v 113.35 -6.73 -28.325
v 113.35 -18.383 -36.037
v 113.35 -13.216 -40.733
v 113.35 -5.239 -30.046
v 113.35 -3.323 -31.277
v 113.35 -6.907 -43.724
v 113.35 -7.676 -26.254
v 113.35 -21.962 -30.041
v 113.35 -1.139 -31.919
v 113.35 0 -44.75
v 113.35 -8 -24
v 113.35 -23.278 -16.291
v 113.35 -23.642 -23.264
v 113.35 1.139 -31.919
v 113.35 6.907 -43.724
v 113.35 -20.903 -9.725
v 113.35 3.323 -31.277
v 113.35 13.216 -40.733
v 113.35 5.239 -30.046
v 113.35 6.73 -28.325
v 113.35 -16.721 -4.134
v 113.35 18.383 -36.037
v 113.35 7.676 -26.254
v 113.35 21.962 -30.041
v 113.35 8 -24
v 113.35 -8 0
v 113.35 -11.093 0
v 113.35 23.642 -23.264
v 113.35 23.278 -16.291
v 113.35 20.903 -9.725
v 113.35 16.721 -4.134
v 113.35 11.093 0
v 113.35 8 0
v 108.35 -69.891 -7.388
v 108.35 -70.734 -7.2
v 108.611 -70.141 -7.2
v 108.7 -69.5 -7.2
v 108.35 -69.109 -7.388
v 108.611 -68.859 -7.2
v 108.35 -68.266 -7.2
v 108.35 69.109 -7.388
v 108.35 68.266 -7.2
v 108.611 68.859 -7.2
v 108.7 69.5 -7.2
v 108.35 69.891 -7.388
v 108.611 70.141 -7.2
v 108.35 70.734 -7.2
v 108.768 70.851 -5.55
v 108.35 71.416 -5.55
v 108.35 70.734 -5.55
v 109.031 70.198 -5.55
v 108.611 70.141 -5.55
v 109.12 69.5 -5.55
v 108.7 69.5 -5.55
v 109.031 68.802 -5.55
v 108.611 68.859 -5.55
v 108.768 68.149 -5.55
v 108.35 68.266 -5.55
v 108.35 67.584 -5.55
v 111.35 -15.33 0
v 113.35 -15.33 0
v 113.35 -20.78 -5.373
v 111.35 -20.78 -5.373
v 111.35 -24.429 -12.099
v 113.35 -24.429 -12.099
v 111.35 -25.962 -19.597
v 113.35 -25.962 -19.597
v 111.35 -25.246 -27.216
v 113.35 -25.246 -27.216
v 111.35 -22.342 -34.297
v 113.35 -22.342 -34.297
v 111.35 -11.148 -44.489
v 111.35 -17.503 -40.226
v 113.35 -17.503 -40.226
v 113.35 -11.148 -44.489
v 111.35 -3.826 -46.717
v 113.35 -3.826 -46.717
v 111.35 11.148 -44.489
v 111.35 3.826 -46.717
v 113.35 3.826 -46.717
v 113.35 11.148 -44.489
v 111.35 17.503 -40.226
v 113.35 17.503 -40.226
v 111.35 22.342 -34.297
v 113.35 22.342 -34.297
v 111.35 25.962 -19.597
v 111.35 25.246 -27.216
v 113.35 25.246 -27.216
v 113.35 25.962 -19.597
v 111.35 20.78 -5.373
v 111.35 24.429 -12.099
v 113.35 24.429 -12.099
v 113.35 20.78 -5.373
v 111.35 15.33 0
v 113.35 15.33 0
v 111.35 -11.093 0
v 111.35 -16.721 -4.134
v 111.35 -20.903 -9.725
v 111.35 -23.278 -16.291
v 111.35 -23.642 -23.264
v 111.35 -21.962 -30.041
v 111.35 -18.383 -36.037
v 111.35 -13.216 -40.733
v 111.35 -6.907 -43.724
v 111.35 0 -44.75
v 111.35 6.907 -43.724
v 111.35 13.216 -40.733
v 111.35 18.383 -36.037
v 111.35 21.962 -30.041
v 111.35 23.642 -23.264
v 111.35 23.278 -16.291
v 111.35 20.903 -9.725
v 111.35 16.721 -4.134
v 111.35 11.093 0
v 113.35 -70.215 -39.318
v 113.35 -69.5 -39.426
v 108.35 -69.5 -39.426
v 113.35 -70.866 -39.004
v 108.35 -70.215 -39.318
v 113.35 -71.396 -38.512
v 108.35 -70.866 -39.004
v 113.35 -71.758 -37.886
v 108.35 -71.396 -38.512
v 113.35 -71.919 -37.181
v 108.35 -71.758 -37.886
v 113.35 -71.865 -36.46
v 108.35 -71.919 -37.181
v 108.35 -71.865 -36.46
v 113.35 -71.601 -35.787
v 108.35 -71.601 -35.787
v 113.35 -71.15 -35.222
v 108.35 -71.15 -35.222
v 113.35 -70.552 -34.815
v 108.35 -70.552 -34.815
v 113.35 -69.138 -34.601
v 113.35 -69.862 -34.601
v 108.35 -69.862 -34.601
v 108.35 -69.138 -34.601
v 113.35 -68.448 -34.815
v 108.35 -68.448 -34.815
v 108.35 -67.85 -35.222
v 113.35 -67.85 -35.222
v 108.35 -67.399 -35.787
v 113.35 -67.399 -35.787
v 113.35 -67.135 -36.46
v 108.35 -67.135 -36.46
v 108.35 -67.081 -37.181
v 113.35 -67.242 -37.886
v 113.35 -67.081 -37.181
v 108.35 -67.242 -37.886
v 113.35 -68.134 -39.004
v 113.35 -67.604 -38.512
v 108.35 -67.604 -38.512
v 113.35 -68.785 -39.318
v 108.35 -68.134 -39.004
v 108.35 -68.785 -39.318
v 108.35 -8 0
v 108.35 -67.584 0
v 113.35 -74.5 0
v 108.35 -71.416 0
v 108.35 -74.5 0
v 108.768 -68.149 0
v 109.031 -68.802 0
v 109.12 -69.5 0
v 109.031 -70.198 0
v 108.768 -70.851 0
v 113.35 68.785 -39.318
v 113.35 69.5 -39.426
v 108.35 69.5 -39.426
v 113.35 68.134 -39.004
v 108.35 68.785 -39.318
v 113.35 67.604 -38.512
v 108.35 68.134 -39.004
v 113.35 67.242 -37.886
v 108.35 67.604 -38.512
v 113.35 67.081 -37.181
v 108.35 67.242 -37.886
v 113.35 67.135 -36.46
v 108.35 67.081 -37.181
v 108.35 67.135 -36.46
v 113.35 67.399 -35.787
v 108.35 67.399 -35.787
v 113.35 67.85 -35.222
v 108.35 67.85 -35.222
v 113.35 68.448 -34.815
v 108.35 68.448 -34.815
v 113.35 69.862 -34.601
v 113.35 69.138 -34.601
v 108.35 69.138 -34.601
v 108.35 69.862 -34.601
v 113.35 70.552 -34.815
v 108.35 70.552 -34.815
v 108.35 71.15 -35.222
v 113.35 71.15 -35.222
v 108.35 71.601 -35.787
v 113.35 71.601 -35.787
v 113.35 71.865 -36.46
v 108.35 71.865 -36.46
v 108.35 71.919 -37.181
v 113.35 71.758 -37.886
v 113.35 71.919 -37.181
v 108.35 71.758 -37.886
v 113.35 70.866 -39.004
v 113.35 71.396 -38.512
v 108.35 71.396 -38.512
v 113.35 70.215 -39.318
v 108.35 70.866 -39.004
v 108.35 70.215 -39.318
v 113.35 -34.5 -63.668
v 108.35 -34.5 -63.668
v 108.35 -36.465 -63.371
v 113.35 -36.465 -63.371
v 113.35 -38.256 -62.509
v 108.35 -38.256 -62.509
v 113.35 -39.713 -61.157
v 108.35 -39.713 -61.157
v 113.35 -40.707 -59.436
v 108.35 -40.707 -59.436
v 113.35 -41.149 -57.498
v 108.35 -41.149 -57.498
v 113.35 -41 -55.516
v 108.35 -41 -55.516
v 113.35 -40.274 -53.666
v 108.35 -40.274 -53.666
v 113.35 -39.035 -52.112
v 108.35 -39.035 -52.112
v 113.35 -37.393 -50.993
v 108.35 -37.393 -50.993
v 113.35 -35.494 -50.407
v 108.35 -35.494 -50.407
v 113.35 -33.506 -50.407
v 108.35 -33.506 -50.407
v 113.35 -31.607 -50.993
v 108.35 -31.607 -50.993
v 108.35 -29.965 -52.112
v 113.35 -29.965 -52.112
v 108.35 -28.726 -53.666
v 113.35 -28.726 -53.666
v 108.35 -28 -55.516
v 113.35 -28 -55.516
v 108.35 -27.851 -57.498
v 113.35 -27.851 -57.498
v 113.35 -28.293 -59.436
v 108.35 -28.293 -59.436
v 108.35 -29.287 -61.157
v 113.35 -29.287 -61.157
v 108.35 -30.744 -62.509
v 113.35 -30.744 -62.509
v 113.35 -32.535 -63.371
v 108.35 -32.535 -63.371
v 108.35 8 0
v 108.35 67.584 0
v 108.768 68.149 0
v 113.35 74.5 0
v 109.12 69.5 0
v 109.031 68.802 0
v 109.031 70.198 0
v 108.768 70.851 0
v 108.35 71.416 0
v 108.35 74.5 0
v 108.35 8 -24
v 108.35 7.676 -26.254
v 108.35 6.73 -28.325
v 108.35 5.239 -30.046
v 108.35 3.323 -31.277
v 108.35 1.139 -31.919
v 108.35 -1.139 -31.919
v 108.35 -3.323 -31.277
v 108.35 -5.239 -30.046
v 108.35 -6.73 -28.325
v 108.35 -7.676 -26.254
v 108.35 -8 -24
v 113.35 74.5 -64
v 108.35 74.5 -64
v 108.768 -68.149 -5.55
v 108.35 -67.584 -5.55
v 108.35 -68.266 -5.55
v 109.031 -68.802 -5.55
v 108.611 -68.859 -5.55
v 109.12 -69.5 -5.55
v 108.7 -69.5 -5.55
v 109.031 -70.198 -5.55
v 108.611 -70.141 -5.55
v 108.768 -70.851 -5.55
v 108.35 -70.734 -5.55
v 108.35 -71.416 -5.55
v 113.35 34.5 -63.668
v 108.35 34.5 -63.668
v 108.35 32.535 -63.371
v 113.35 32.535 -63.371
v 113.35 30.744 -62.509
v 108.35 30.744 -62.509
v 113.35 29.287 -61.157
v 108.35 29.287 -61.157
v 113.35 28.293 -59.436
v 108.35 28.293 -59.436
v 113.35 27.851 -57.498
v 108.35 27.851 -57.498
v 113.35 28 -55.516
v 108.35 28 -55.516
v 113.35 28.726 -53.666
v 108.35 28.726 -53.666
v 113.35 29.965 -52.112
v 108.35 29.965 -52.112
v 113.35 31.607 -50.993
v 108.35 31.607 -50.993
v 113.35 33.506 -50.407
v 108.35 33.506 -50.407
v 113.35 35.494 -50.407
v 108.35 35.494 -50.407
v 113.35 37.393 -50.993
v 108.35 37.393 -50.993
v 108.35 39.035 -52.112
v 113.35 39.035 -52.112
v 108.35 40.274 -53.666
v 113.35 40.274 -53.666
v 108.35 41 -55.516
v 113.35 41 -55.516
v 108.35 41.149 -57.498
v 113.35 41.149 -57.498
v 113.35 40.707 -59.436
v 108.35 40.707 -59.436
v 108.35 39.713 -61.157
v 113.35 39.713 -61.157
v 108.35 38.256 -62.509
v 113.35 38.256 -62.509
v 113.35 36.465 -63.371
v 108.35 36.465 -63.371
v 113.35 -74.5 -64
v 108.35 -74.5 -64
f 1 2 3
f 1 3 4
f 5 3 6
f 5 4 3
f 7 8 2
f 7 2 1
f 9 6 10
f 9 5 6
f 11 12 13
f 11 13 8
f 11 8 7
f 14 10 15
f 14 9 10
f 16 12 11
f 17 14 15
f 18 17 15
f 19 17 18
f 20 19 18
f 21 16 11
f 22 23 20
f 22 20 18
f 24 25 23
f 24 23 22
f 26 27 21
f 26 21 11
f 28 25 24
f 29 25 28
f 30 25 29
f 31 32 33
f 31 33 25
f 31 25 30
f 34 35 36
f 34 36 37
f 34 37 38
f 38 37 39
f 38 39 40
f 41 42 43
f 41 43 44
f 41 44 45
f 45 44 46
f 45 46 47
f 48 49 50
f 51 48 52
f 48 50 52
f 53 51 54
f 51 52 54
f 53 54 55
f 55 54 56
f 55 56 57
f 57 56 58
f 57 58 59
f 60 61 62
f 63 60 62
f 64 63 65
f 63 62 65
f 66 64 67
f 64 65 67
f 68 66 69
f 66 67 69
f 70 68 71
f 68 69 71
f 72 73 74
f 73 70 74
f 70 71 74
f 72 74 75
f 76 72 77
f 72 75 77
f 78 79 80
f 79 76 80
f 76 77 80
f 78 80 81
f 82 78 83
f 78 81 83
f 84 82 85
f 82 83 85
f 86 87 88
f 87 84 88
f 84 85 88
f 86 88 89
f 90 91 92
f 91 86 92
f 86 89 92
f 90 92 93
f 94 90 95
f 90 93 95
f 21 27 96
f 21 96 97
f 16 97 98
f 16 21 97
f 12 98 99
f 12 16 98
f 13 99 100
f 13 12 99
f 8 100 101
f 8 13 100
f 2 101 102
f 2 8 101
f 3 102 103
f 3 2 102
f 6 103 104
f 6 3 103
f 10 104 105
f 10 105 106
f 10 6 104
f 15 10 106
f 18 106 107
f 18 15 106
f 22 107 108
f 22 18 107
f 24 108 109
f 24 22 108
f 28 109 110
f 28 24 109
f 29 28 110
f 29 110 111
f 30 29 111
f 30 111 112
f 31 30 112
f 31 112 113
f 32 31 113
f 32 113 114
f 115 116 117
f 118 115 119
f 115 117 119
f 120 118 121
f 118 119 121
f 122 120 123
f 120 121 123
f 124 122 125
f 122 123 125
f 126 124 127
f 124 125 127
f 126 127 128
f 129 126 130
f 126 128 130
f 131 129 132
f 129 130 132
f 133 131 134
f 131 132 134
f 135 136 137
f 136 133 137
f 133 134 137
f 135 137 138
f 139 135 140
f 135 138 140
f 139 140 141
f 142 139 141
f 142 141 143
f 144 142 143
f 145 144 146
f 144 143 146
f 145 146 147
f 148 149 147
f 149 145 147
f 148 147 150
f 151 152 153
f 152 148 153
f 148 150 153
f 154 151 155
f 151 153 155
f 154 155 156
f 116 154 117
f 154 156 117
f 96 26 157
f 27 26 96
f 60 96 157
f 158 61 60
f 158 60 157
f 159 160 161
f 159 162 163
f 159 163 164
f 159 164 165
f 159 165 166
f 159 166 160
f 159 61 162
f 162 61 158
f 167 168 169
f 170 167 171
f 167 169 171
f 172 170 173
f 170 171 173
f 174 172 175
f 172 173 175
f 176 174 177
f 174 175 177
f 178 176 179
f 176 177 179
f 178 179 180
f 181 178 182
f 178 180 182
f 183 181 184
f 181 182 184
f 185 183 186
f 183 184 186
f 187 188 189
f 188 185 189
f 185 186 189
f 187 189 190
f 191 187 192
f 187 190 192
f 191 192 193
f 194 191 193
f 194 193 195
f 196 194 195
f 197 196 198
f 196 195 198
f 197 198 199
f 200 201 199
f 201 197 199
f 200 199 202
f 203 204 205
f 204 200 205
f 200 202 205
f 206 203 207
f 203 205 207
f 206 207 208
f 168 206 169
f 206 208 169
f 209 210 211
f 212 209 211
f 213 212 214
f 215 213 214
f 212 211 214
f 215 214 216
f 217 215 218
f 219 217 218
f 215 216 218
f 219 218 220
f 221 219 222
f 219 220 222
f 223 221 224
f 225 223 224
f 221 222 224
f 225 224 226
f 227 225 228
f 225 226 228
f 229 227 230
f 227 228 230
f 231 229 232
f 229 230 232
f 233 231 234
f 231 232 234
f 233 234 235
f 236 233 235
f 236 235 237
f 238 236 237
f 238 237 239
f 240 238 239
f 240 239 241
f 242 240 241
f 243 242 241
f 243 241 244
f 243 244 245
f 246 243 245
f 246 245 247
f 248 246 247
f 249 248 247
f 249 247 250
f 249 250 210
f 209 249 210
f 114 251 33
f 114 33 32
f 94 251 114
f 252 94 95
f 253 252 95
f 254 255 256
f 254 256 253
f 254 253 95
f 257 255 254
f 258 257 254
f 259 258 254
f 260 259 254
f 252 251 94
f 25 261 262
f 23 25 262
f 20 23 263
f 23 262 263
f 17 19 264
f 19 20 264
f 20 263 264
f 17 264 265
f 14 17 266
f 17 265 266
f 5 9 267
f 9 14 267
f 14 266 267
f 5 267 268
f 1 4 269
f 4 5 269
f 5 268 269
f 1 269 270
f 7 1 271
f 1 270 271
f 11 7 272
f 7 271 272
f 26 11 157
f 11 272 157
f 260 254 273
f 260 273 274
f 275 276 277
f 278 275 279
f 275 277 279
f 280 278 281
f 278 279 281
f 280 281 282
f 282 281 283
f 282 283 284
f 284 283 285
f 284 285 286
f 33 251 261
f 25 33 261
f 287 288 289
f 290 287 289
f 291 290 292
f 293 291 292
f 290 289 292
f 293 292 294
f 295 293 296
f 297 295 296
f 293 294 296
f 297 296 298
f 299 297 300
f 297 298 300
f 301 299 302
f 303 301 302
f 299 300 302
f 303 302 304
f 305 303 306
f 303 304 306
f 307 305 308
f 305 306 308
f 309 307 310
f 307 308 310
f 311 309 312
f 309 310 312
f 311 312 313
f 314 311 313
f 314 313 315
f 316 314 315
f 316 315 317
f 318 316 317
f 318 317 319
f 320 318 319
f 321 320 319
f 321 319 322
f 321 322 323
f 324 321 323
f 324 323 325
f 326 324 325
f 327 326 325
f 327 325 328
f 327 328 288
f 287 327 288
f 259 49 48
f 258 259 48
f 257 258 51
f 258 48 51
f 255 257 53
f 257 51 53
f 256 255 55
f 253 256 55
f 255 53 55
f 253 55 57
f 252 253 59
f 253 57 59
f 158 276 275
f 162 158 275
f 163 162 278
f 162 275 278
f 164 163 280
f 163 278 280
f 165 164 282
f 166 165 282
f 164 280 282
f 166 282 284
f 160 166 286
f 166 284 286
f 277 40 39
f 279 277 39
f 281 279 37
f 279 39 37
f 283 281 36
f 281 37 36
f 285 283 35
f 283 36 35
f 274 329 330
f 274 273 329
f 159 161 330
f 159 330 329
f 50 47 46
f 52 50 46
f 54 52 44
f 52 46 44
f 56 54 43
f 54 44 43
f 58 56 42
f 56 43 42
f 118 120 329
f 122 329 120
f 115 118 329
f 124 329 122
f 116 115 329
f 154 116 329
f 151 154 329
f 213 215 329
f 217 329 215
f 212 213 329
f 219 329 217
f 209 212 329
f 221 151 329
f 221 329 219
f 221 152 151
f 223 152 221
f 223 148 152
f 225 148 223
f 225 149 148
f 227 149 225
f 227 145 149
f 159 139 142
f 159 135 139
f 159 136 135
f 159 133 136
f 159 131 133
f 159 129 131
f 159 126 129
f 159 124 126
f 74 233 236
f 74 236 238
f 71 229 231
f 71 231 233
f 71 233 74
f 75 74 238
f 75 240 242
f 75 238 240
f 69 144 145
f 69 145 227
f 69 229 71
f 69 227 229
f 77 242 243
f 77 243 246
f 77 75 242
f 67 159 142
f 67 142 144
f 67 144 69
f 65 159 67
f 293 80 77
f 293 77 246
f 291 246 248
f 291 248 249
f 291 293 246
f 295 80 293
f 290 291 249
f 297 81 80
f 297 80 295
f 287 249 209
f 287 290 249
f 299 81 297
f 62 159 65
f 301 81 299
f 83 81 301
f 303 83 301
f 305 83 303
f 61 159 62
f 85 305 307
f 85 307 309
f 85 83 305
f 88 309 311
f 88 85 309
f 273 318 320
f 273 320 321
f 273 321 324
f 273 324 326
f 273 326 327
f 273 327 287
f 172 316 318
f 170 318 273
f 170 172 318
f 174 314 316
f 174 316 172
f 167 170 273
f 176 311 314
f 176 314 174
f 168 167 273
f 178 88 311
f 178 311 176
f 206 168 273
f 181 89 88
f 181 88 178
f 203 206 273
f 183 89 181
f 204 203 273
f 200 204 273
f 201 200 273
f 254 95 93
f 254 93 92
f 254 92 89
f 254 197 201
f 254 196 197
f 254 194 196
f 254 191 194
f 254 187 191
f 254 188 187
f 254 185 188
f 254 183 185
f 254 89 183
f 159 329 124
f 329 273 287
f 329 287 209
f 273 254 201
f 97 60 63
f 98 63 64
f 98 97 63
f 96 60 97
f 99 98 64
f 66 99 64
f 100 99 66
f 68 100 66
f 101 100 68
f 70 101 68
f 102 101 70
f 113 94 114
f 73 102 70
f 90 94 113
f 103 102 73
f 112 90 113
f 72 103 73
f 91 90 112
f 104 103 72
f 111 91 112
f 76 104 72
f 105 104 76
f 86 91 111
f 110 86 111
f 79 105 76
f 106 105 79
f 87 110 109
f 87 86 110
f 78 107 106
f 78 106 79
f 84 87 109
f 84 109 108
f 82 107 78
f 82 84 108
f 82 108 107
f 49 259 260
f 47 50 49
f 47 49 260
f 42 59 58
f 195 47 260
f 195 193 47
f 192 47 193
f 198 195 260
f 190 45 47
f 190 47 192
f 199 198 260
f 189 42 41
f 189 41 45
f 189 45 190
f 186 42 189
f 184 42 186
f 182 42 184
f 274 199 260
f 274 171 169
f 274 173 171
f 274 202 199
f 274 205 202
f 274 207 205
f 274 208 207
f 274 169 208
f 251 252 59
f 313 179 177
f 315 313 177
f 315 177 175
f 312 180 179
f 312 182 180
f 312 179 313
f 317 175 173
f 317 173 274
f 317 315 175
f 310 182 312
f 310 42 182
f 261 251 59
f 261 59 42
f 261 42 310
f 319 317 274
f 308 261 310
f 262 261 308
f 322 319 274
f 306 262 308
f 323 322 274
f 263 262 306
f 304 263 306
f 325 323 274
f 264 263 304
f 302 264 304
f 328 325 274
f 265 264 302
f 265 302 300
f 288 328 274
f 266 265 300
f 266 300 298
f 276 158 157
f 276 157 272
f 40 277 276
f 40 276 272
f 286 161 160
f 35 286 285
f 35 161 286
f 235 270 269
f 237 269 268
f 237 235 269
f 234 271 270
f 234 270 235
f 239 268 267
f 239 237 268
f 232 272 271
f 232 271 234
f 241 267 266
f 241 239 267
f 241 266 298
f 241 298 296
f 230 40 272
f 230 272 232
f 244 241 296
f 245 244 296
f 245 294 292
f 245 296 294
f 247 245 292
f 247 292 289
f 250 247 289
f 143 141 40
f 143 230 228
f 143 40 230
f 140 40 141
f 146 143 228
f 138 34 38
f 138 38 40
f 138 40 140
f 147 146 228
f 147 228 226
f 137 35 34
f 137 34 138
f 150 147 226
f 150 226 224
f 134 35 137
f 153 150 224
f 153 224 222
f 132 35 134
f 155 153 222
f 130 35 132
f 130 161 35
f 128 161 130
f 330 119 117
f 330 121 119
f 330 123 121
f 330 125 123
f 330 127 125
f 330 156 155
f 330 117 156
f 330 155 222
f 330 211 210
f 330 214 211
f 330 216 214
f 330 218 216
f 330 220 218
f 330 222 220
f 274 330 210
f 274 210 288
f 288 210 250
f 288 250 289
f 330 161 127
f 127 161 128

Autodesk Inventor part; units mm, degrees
ref_plane "XZ Plane" through (0, 0, 0) normal (0, 1, 0) x (-1, 0, 0)
ref_plane "XY Plane" through (0, 0, 0) normal (0, 0, 1) x (1, 0, 0)
sketch "Sketch1" plane through (0, 0, 0) normal (0, 0, 1) x (1, 0, 0)
  line L0 (-111.35, -74.5) -> (111.35, -74.5)
  line L1 (111.35, -74.5) -> (111.35, 74.5)
  line L2 (111.35, 74.5) -> (-111.35, 74.5)
  line L3 (-111.35, 74.5) -> (-111.35, -74.5)
  line L4 (-111.35, -74.5) -> (111.35, 74.5) construction
  line L5 (111.35, -74.5) -> (-111.35, 74.5) construction
  point P0 (0, 0)
  dimension "d0" = 222.7
  dimension "d1" = 149
extrude "MainInnerBodyExtrusion" add sketch "Sketch1" against normal blind 50
sketch "Sketch3" plane through (0, 0, 0) normal (0, 0, 1) x (1, 0, 0)
  line L0 (36.65, -27) -> (95.65, -27)
  line L1 (95.65, -27) -> (95.65, 27)
  line L2 (95.65, 27) -> (36.65, 27)
  line L3 (36.65, 27) -> (36.65, -27)
  line L4 (36.65, -27) -> (95.65, 27) construction
  line L5 (95.65, -27) -> (36.65, 27) construction
  line L6 (111.35, -74.5) -> (111.35, 74.5) projected
  line L7 (0, 0) -> (111.35, 0) construction
  line L8 (-111.35, -74.5) -> (-111.35, 74.5) construction
  line L9 (-111.35, 74.5) -> (-111.35, -74.5) projected
  point P0 (66.15, 0)
  point P1 (66.15, 0)
  dimension "d5" = 15.7
  dimension "d6" = 54
  dimension "d7" = 59
extrude "HoleForCamerabase" cut sketch "Sketch3" against normal blind 47
sketch "Sketch4" plane through (0, 0, 0) normal (0, 0, 1) x (1, 0, 0)
  line L0 (0, 0) -> (-111.35, 0) construction
  line L1 (-111.35, -74.5) -> (-111.35, 74.5) construction
  line L2 (-108.35, -31) -> (-92.35, -31)
  line L3 (-92.35, -31) -> (-92.35, 31)
  line L4 (-92.35, 31) -> (-108.35, 31)
  line L5 (-108.35, 31) -> (-108.35, -31)
  line L6 (-108.35, -31) -> (-92.35, 31) construction
  line L7 (-92.35, -31) -> (-108.35, 31) construction
  point P0 (-100.35, 0)
  dimension "d13" = 16
  dimension "d14" = 62
  dimension "d15" = 3
extrude "HoleForFan" cut sketch "Sketch4" against normal blind 47
sketch "Sketch6" plane through (0, 0, 0) normal (0, 0, 1) x (1, 0, 0)
  line L0 (-111.35, -74.5) -> (-111.35, 74.5) construction
  line L1 (-111.35, 0) -> (111.35, 0) construction
  line L2 (111.35, 74.5) -> (111.35, -74.5) construction
  line L3 (-11.35, -64.5) -> (20.65, -64.5)
  line L4 (20.65, -64.5) -> (20.65, 64.5)
  line L5 (20.65, 64.5) -> (-11.35, 64.5)
  line L6 (-11.35, 64.5) -> (-11.35, -64.5)
  line L7 (-11.35, -64.5) -> (20.65, 64.5) construction
  line L8 (20.65, -64.5) -> (-11.35, 64.5) construction
  line L9 (36.65, -27) -> (36.65, 27) projected
  point P0 (0, 0)
  point P1 (4.65, 0)
  dimension "d20" = 32
  dimension "d21" = 129
  dimension "d88" = 16
extrude "HoleForPi" cut sketch "Sketch6" against normal blind 47
sketch "Sketch7" plane through (0, 0, 0) normal (0, 0, 1) x (1, 0, 0)
  line L0 (0, 0) -> (-111.35, 0) construction
  line L1 (-111.35, 74.5) -> (-111.35, -74.5) construction
  line L2 (-76.35, -59) -> (-27.35, -59)
  line L3 (-27.35, -59) -> (-27.35, 59)
  line L4 (-27.35, 59) -> (-76.35, 59)
  line L5 (-76.35, 59) -> (-76.35, -59)
  line L6 (-76.35, -59) -> (-27.35, 59) construction
  line L7 (-27.35, -59) -> (-76.35, 59) construction
  line L8 (-11.35, -64.5) -> (-11.35, 64.5) projected
  line L9 (-92.35, 31) -> (-92.35, -31) construction
  point P0 (-51.85, 0)
  dimension "d25" = 16
  dimension "d26" = 49
  dimension "d27" = 118
extrude "HoleForPoeAdapter" cut sketch "Sketch7" against normal blind 47
sketch "Sketch10" plane through (0, 0, 0) normal (0, 0, 1) x (1, 0, 0)
  line L0 (39.35, 36.5) -> (108.35, 36.5)
  line L1 (108.35, 36.5) -> (108.35, 64.5)
  line L2 (108.35, 64.5) -> (39.35, 64.5)
  line L3 (39.35, 64.5) -> (39.35, 36.5)
  line L4 (39.35, 36.5) -> (108.35, 64.5) construction
  line L5 (108.35, 36.5) -> (39.35, 64.5) construction
  line L6 (111.35, 74.5) -> (-111.35, 74.5) projected
  line L7 (111.35, -74.5) -> (111.35, 74.5) projected
  point P0 (0, 0)
  point P1 (73.85, 50.5)
  point P2 (94.85, 8.5)
  point P3 (108.35, 50.5)
  dimension "d36" = 69
  dimension "d37" = 28
  dimension "d85" = 3
extrude "HoleForThermister" cut sketch "Sketch10" against normal blind 47
sketch "Sketch11" plane through (0, 0, 0) normal (0, 0, 1) x (1, 0, 0)
  line L0 (58.35, -64.5) -> (108.35, -64.5)
  line L1 (108.35, -64.5) -> (108.35, -47.5)
  line L2 (108.35, -47.5) -> (58.35, -47.5)
  line L3 (58.35, -47.5) -> (58.35, -64.5)
  line L4 (58.35, -64.5) -> (108.35, -47.5) construction
  line L5 (108.35, -64.5) -> (58.35, -47.5) construction
  line L6 (111.35, -74.5) -> (111.35, 74.5) projected
  line L7 (-111.35, -74.5) -> (111.35, -74.5) projected
  line L8 (95.65, -27) -> (36.65, -27) projected
  line L9 (20.65, 64.5) -> (20.65, -64.5) projected
  point P0 (0, 0)
  point P1 (83.35, -56)
  point P2 (94.85, -8.5)
  point P3 (83.35, -47.5)
  point P4 (58.35, -56)
  point P5 (111.35, 74.5)
  dimension "d42" = 50
  dimension "d43" = 17
  dimension "d86" = 3
  dimension "d87" = 10
extrude "HoleForSensor" cut sketch "Sketch11" against normal blind 31.5
sketch "Sketch15" plane through (-111.35, -74.5, 0) normal (-1, 0, 0) x (0, 0, 1)
  line L0 (0, 149) -> (0, 0) projected
  line L1 (0, 149) -> (-50, 149) projected
  line L2 (-50, 0) -> (-50, 149) projected
  line L3 (0, 0) -> (-50, 0) projected
  line L4 (0, 0) -> (0, 149) projected
  line L5 (0, 101.5) -> (0, 47.5) projected
  line L6 (0, 74.5) -> (-30, 74.5) construction
  line L7 (0, 76.5) -> (-29.9333, 76.5)
  line L8 (0, 84.5) -> (-28.2843, 84.5)
  line L9 (0, 80.5) -> (-29.3939, 80.5)
  line L10 (0, 76.5) -> (0, 74.5)
  line L11 (0, 88.5) -> (-26.533, 88.5)
  line L12 (0, 92.5) -> (-24, 92.5)
  line L13 (-20.5913, 97.5) -> (0, 97.5)
  line L14 (-14.9666, 101.5) -> (0, 101.5)
  line L15 (0, 84.5) -> (0, 80.5)
  line L16 (0, 101.5) -> (0, 97.5)
  line L17 (0, 92.5) -> (0, 88.5)
  line L18 (0, 72.5) -> (-29.9333, 72.5)
  line L19 (0, 64.5) -> (-28.2843, 64.5)
  line L20 (0, 68.5) -> (-29.3939, 68.5)
  line L21 (0, 72.5) -> (0, 74.5)
  line L22 (0, 60.5) -> (-26.533, 60.5)
  line L23 (0, 56.5) -> (-24, 56.5)
  line L24 (-20.5913, 51.5) -> (0, 51.5)
  line L25 (-14.9666, 47.5) -> (0, 47.5)
  line L26 (0, 64.5) -> (0, 68.5)
  line L27 (0, 56.5) -> (0, 60.5)
  line L28 (0, 47.5) -> (0, 51.5)
  line L29 (0, 72.5) -> (0, 76.5)
  line L30 (0, 80.5) -> (0, 84.5)
  line L31 (0, 88.5) -> (0, 92.5)
  line L32 (0, 97.5) -> (0, 149)
  arc A0 (-28.2843, 84.5) -> (-29.3939, 80.5) centre (0, 74.5) ccw
  arc A1 (-14.9666, 101.5) -> (-20.5913, 97.5) centre (0, 74.5) ccw
  arc A2 (-24, 92.5) -> (-26.533, 88.5) centre (0, 74.5) ccw
  arc A3 (-29.9333, 76.5) -> (-29.9333, 72.5) centre (0, 74.5) ccw
  arc A4 (-29.3939, 68.5) -> (-28.2843, 64.5) centre (0, 74.5) ccw
  arc A5 (-26.533, 60.5) -> (-24, 56.5) centre (0, 74.5) ccw
  arc A6 (-20.5913, 51.5) -> (-14.9666, 47.5) centre (0, 74.5) ccw
  point P0 (0, 82)
  point P1 (0, 67.0167)
  point P2 (0, 4.25)
  point P3 (-10.2956, 97.5)
  point P4 (0, 47.5)
  point P5 (0, 51.5)
  point P6 (0, 56.5)
  point P7 (0, 60.5)
  point P8 (0, 64.5)
  point P9 (0, 68.5)
  point P10 (0, 72.5)
  point P11 (0, 80.5)
  point P12 (0, 84.5)
  point P13 (0, 88.5)
  point P14 (0, 92.5)
  point P15 (0, 97.5)
  point P16 (0, 101.5)
  dimension "d69" = 2
  dimension "d71" = 4
  dimension "d72" = 4
  dimension "d73" = 4
  dimension "d75" = 4
  dimension "d142" = 30
extrude "SlotsForRearFan" cut sketch "Sketch15" against normal up to surface (3 mm away) contours L0 L13 A1 L14 | L0 L11 A2 L12 | L25 A6 L24 L0 | L0 L9 A0 L8 | L23 A5 L22 L0 | L0 L18 A3 L7 | L19 A4 L20 L0
sketch "Sketch16" plane through (0, 0, -47) normal (0, 0, 1) x (1, 0, 0)
  line L0 (95.65, 27) -> (95.65, -27) projected
  line L1 (80.15, 10.765) -> (80.15, -11.235) construction
  line L2 (78.65, 10.765) -> (78.65, -11.235)
  line L3 (75.65, -11.235) -> (75.65, 10.765)
  line L4 (72.65, 8.7746) -> (72.65, -9.2446)
  line L5 (69.65, 3.5785) -> (69.65, -4.0485)
  line L6 (81.65, 10.765) -> (81.65, -11.235)
  line L7 (84.65, -11.235) -> (84.65, 10.765)
  line L8 (87.65, 8.7746) -> (87.65, -9.2446)
  line L9 (90.65, 3.5785) -> (90.65, -4.0485)
  line L10 (73.7991, 10.765) -> (75.65, 10.765)
  line L11 (75.65, -11.235) -> (73.7991, -11.235)
  line L12 (73.7991, -11.235) -> (72.65, -9.2446)
  line L13 (69.65, -4.0485) -> (67.4483, -0.235)
  line L14 (67.4483, -0.235) -> (69.65, 3.5785)
  line L15 (72.65, 8.7746) -> (73.7991, 10.765)
  line L16 (78.65, 10.765) -> (81.65, 10.765)
  line L17 (84.65, 10.765) -> (86.5009, 10.765)
  line L18 (86.5009, -11.235) -> (84.65, -11.235)
  line L19 (81.65, -11.235) -> (78.65, -11.235)
  line L20 (92.8517, -0.235) -> (90.65, -4.0485)
  line L21 (87.65, -9.2446) -> (86.5009, -11.235)
  line L22 (86.5009, 10.765) -> (87.65, 8.7746)
  line L23 (90.65, 3.5785) -> (92.8517, -0.235)
  point P0 (0, 0)
  point P1 (80.15, -0.235)
  point P2 (69.65, -0.235)
  dimension "d78" = 15.5
  dimension "d89" = 1.5
  dimension "d90" = 3
  dimension "d91" = 3
  dimension "d92" = 3
extrude "VentForCamera" cut sketch "Sketch16" against normal through all
sketch "Sketch18" plane through (111.35, -74.5, 0) normal (1, 0, 0) x (0, 0, -1)
  line L0 (0, 74.5) -> (29.6767, 74.5) construction
  arc A0 (24, 66.5) -> (24, 82.5) centre (24, 74.5) ccw
  line L1 (0, 0) -> (0, 149) projected
  line L2 (24, 82.5) -> (0, 82.5)
  line L3 (24, 66.5) -> (0, 66.5)
  line L4 (0, 82.5) -> (0, 66.5)
  point P0 (0, 74.5)
  dimension "d97" = 16
  dimension "d137" = 24
extrude "HoleForLens" cut sketch "Sketch18" against normal up to surface (15.7 mm away)
sketch "Sketch23" plane through (0, 0, 0) normal (0, 0, 1) x (1, 0, 0)
  line L0 (-106.35, -69.5) -> (106.35, -69.5) construction
  line L1 (106.35, -69.5) -> (106.35, 69.5) construction
  line L2 (106.35, 69.5) -> (-106.35, 69.5) construction
  line L3 (-106.35, 69.5) -> (-106.35, -69.5) construction
  line L4 (-106.35, -69.5) -> (106.35, 69.5) construction
  line L5 (106.35, -69.5) -> (-106.35, 69.5) construction
  line L6 (111.35, -74.5) -> (111.35, -8) projected
  line L7 (111.35, 74.5) -> (-111.35, 74.5) projected
  line L8 (-111.35, -27) -> (-111.35, -74.5) projected
  line L9 (-111.35, 74.5) -> (-111.35, 27) projected
  line L10 (111.35, 8) -> (111.35, 74.5) projected
  point P0 (0, 0)
  point P1 (35.15, -69.5)
  point P2 (-35.15, -69.5)
  point P3 (-35.15, 69.5)
  point P4 (35.15, 69.5)
  dimension "d106" = 5
  dimension "d108" = 5
  dimension "d222" = 76.2
  dimension "d223" = 76.2
  dimension "d224" = 76.2
  dimension "d225" = 76.2
hole "Hole for 6-32 Insert" at (-106.35, 69.5, 0) at (106.35, 69.5, 0) at (106.35, -69.5, 0) at (-106.35, -69.5, 0) at (-35.15, -69.5, 0) at (35.15, -69.5, 0) at (-35.15, 69.5, 0) at (35.15, 69.5, 0) direction (0, 0, -1) diameter 4.7 depth 7.2 tip angle 118 counterbore diameter 5.54 counterbore depth 5.55
hole "Screw hole for 6-32 screw" at (-106.35, -69.5, 0) at (106.35, -69.5, 0) at (106.35, 69.5, 0) at (-106.35, 69.5, 0) direction (0, 0, -1) diameter 3.797 depth 15 tip angle 118 clearance for "Hex Machine Screw" size "#6" standard "Ansi Unified Screw Threads"
sketch "Sketch24" plane through (-111.35, -74.5, 0) normal (0, -1, 0) x (1, 0, 0)
  line L0 (0, -50) -> (222.7, -50) construction
  line L1 (222.7, 0) -> (207, 0) construction
  line L2 (0, 0) -> (0, -50) projected
  line L3 (111.3501, -25) -> (0, -25) construction
  line L4 (111.3501, -25) -> (222.7, -24.84) construction
  line L5 (222.7, 0) -> (222.7, -50) construction
  point P0 (111.35, 0)
  dimension "d226" = 25
  dimension "d227" = 111.3501
hole "Side hole for 1-4 20 insert" at (0.0001, -74.5, -25) direction (0, 1, 0) diameter 7.666 depth 9.53 tip angle 118 counterbore diameter 8.406 counterbore depth 7.41 clearance for "Hex Machine Screw" size "1/4" standard "Ansi Unified Screw Threads"
mirror "Mirror for side insert" about plane through (0, 0, 0) normal (0, 1, 0) of "Side hole for 1-4 20 insert"
sketch "Sketch25" plane through (0, 0, 0) normal (0, 0, 1) x (1, 0, 0)
  line L0 (111.35, 74.5) -> (-111.35, 74.5) projected
  line L1 (-111.35, 74.5) -> (-111.35, 27) projected
  line L2 (-111.35, -74.5) -> (111.35, -74.5) projected
  line L3 (81.65, -11.235) -> (78.65, -11.235) projected
  line L4 (78.65, -11.235) -> (78.65, 10.765) projected
  line L5 (78.65, 10.765) -> (81.65, 10.765) projected
  line L6 (81.65, 10.765) -> (81.65, -11.235) projected
  line L7 (73.7991, 10.765) -> (75.65, 10.765) projected
  line L8 (75.65, 10.765) -> (75.65, -11.235) projected
  line L9 (75.65, -11.235) -> (73.7991, -11.235) projected
  line L10 (73.7991, -11.235) -> (72.65, -9.2446) projected
  line L11 (72.65, -9.2446) -> (72.65, 8.7746) projected
  line L12 (72.65, 8.7746) -> (73.7991, 10.765) projected
  line L13 (87.65, 8.7746) -> (87.65, -9.2446) projected
  line L14 (87.65, -9.2446) -> (86.5009, -11.235) projected
  line L15 (86.5009, -11.235) -> (84.65, -11.235) projected
  line L16 (84.65, -11.235) -> (84.65, 10.765) projected
  line L17 (84.65, 10.765) -> (86.5009, 10.765) projected
  line L18 (86.5009, 10.765) -> (87.65, 8.7746) projected
  line L19 (69.65, 3.5785) -> (69.65, -4.0485) projected
  line L20 (69.65, -4.0485) -> (67.4483, -0.235) projected
  line L21 (67.4483, -0.235) -> (69.65, 3.5785) projected
  line L22 (92.8517, -0.235) -> (90.65, -4.0485) projected
  line L23 (90.65, -4.0485) -> (90.65, 3.5785) projected
  line L24 (90.65, 3.5785) -> (92.8517, -0.235) projected
  line L25 (95.65, 27) -> (95.65, -27) projected
  line L26 (36.65, 27) -> (95.65, 27) projected
  line L27 (36.65, -27) -> (36.65, 27) projected
  line L28 (95.65, -27) -> (36.65, -27) projected
  line L29 (111.35, -74.5) -> (111.35, -8) projected
  line L30 (111.35, 8) -> (111.35, 74.5) projected
  line L31 (-108.35, -64.5) -> (108.35, -64.5)
  line L32 (108.35, -64.5) -> (108.35, 64.5)
  line L33 (108.35, 64.5) -> (-108.35, 64.5)
  line L34 (-108.35, 64.5) -> (-108.35, -64.5)
  line L35 (-108.35, -64.5) -> (108.35, 64.5) construction
  line L36 (108.35, -64.5) -> (-108.35, 64.5) construction
  line L37 (-27.35, 59) -> (-27.35, -59) projected
  point P0 (0, 0)
  dimension "d138" = 10
  dimension "d139" = 3
extrude "Extrusion18" cut sketch "Sketch25" against normal blind 25 contours L34 L33 L32 L31
sketch "Sketch26" plane through (-111.35, -74.5, -50) normal (-1, 0, 0) x (0, 0, 1)
  arc A0 (50, 124) -> (50, 134) centre (50, 129) ccw
  circle A1 centre (50, 129) radius 5
  point P0 (50, 74.5)
  point P1 (50, 124)
extrude "HoleForPowerWire" cut sketch "Sketch26" against normal up to surface (3 mm away)
sketch "Sketch35" plane through (111.35, -74.5, -50) normal (1, 0, 0) x (0, 0, -1)
  circle A0 centre (-13, 5) radius 2.4257
  circle A1 centre (-13, 144) radius 2.4257
  line L0 (-50, 0) -> (0, 0) projected
  line L1 (-50, 149) -> (0, 149) projected
  line L2 (-3, 139) -> (-3, 10) projected
  point P0 (-50, 74.5)
  dimension "d215" = 4.8514
  dimension "d216" = 5
  dimension "d217" = 5
  dimension "d218" = 10
  dimension "d219" = 10
extrude "Extrusion21" cut sketch "Sketch35" against normal blind 9.525
sketch "Sketch37" plane through (-111.35, -74.5, -50) normal (-1, 0, 0) x (0, 0, 1)
  arc A0 (50, 134) -> (50, 124) centre (50, 129) ccw projected
  line L0 (50, 149) -> (50, 134) projected
  line L1 (50, 149) -> (0, 149) projected
  line L2 (0, 0) -> (0, 149) projected
  line L3 (50, 0) -> (0, 0) projected
  line L4 (50, 47.5) -> (50, 0) projected
  line L5 (50, 47.5) -> (35.0334, 47.5) projected
  arc A1 (29.4087, 51.5) -> (35.0334, 47.5) centre (50, 74.5) ccw projected
  line L6 (29.4087, 51.5) -> (50, 51.5) projected
  line L7 (50, 56.5) -> (50, 51.5) projected
  line L8 (50, 56.5) -> (26, 56.5) projected
  arc A2 (23.467, 60.5) -> (26, 56.5) centre (50, 74.5) ccw projected
  line L9 (23.467, 60.5) -> (50, 60.5) projected
  line L10 (50, 64.5) -> (50, 60.5) projected
  line L11 (50, 64.5) -> (21.7157, 64.5) projected
  arc A3 (20.6061, 68.5) -> (21.7157, 64.5) centre (50, 74.5) ccw projected
  line L12 (20.6061, 68.5) -> (50, 68.5) projected
  line L13 (50, 72.5) -> (50, 68.5) projected
  line L14 (50, 72.5) -> (20.0667, 72.5) projected
  arc A4 (20.0667, 76.5) -> (20.0667, 72.5) centre (50, 74.5) ccw projected
  line L15 (20.0667, 76.5) -> (50, 76.5) projected
  line L16 (50, 80.5) -> (50, 76.5) projected
  line L17 (50, 80.5) -> (20.6061, 80.5) projected
  arc A5 (21.7157, 84.5) -> (20.6061, 80.5) centre (50, 74.5) ccw projected
  line L18 (21.7157, 84.5) -> (50, 84.5) projected
  line L19 (50, 88.5) -> (50, 84.5) projected
  line L20 (50, 88.5) -> (23.467, 88.5) projected
  arc A6 (26, 92.5) -> (23.467, 88.5) centre (50, 74.5) ccw projected
  line L21 (26, 92.5) -> (50, 92.5) projected
  line L22 (50, 97.5) -> (50, 92.5) projected
  line L23 (50, 97.5) -> (29.4087, 97.5) projected
  arc A7 (35.0334, 101.5) -> (29.4087, 97.5) centre (50, 74.5) ccw projected
  line L24 (35.0334, 101.5) -> (50, 101.5) projected
  line L25 (50, 124) -> (50, 101.5) projected
  line L26 (0, 149) -> (50, 149)
  line L27 (50, 149) -> (50, 0)
  line L28 (50, 0) -> (0, 0)
  line L29 (0, 0) -> (0, 149)
extrude "Extrusion22" add sketch "Sketch37" along normal blind 2 contours A0 L25 L24 A7 L23 L22 L21 A6 L20 L19 L18 A5 L17 L16 L15 A4 L14 L13 L12 A3 L11 L10 L9 A2 L8 L7 L6 A1 L5 L4 L3 L2 L1 L0
sketch "Sketch38" plane through (111.35, -74.5, -50) normal (1, 0, 0) x (0, 0, -1)
  circle A0 centre (-13, 144) radius 2.4257 projected
  circle A1 centre (-13, 5) radius 2.4257 projected
  line L0 (-50, 82.5) -> (-50, 149) projected
  line L1 (-50, 0) -> (0, 0) projected
  line L2 (0, 149) -> (0, 0) projected
  line L3 (-50, 149) -> (0, 149) projected
  line L4 (-50, 0) -> (-50, 66.5) projected
  arc A2 (-50, 65.1192) -> (-50, 83.8808) centre (-29, 74.5) ccw projected
  line L5 (-26, 66.5) -> (-50, 66.5) projected
  arc A3 (-26, 66.5) -> (-26, 82.5) centre (-26, 74.5) ccw projected
  line L6 (-50, 82.5) -> (-26, 82.5) projected
  line L7 (-26, 66.5) -> (-50, 66.5) projected
  line L8 (-50, 82.5) -> (-26, 82.5) projected
  arc A4 (-26, 66.5) -> (-26, 82.5) centre (-26, 74.5) ccw projected
  point P0 (-50, 74.5)
extrude "Extrusion23" add sketch "Sketch38" along normal blind 2
sketch "Sketch39" plane through (0, 0, -50) normal (0, 0, -1) x (-1, 0, 0)
  line L0 (-78.65, -11.235) -> (-81.65, -11.235) projected
  line L1 (-81.65, -11.235) -> (-81.65, 10.765) projected
  line L2 (-81.65, 10.765) -> (-78.65, 10.765) projected
  line L3 (-78.65, 10.765) -> (-78.65, -11.235) projected
  line L4 (-75.65, 10.765) -> (-73.7991, 10.765) projected
  line L5 (-73.7991, 10.765) -> (-72.65, 8.7746) projected
  line L6 (-72.65, 8.7746) -> (-72.65, -9.2446) projected
  line L7 (-72.65, -9.2446) -> (-73.7991, -11.235) projected
  line L8 (-73.7991, -11.235) -> (-75.65, -11.235) projected
  line L9 (-75.65, -11.235) -> (-75.65, 10.765) projected
  line L10 (-87.65, -9.2446) -> (-87.65, 8.7746) projected
  line L11 (-87.65, 8.7746) -> (-86.5009, 10.765) projected
  line L12 (-86.5009, 10.765) -> (-84.65, 10.765) projected
  line L13 (-84.65, 10.765) -> (-84.65, -11.235) projected
  line L14 (-84.65, -11.235) -> (-86.5009, -11.235) projected
  line L15 (-86.5009, -11.235) -> (-87.65, -9.2446) projected
  line L16 (-69.65, -4.0485) -> (-69.65, 3.5785) projected
  line L17 (-69.65, 3.5785) -> (-67.4483, -0.235) projected
  line L18 (-67.4483, -0.235) -> (-69.65, -4.0485) projected
  line L19 (-90.65, -4.0485) -> (-92.8517, -0.235) projected
  line L20 (-92.8517, -0.235) -> (-90.65, 3.5785) projected
  line L21 (-90.65, 3.5785) -> (-90.65, -4.0485) projected
  line L22 (113.35, -74.5) -> (-113.35, -74.5) projected
  line L23 (113.35, 74.5) -> (113.35, -74.5) projected
  line L24 (-113.35, 74.5) -> (113.35, 74.5) projected
  line L25 (-113.35, -74.5) -> (-113.35, 74.5) projected
  line L26 (113.35, -74.5) -> (-113.35, -74.5) projected
  line L27 (-113.35, 74.5) -> (113.35, 74.5)
  line L28 (113.35, 74.5) -> (113.35, -74.5)
  line L29 (113.35, -74.5) -> (-113.35, -74.5)
  line L30 (-113.35, -74.5) -> (-113.35, 74.5)
  point P0 (0, 0)
extrude "ExtrusionForBottom" add sketch "Sketch39" along normal blind 14
sketch "Sketch40" plane through (113.35, -74.5, -50) normal (1, 0, 0) x (0, 0, -1)
  line L0 (-50, 0) -> (14, 0) construction
  line L1 (7, 0) -> (7, 149) construction
  line L2 (-50, 149) -> (14, 149) construction
  line L3 (14, 149) -> (14, 0) construction
  point P0 (-50, 74.5)
  point P1 (7, 40)
  point P2 (7, 109)
  dimension "d234" = 7
  dimension "d235" = 40
  dimension "d236" = 40
hole "10-32 holesToBoltFixture" at (113.35, -34.5, -57) at (113.35, 34.5, -57) direction (-1, 0, 0) diameter 5.105 end through all counterbore diameter 13.335 counterbore depth 6.35 clearance for "Hex Machine Screw" size "#10" standard "Ansi Unified Screw Threads"
ref_plane "Work Plane1" through (30, 0, 0) normal (1, 0, 0) x (0, 1, 0)
ref_plane "Work Plane2" through (-20, 0, 0) normal (1, 0, 0) x (0, 1, 0)
mirror "Mirror4" about plane through (0, 0, 0) normal (1, 0, 0) of "10-32 holesToBoltFixture"
sketch "Sketch43" plane through (113.35, -74.5, -50) normal (1, 0, 0) x (0, 0, -1)
  circle A0 centre (7, 40) radius 6.6675 projected
  circle A1 centre (7, 109) radius 6.6675 projected
  line L0 (-50, 66.5) -> (-50, 0) projected
  line L1 (-50, 0) -> (14, 0) projected
  line L2 (14, 149) -> (14, 0) projected
  line L3 (-50, 149) -> (14, 149) projected
  line L4 (-50, 149) -> (-50, 82.5) projected
  line L5 (-50, 82.5) -> (-26, 82.5) projected
  arc A2 (-26, 66.5) -> (-26, 82.5) centre (-26, 74.5) ccw projected
  line L6 (-26, 66.5) -> (-50, 66.5) projected
  circle A3 centre (-13, 144) radius 2.4257 projected
  circle A4 centre (-13, 5) radius 2.4257 projected
  circle A5 centre (-29, 74.5) radius 26
  circle A6 centre (-29, 74.5) radius 23.75
  point P0 (-50, 74.5)
  point P1 (-50, 85.5934)
  point P2 (-50, 63.4066)
  point P3 (-50, 59.1703)
  point P4 (-50, 89.8297)
  dimension "d255" = 21
  dimension "d256" = 52
  dimension "d257" = 47.5
extrude "CutOutForFilter" cut sketch "Sketch43" against normal blind 2 contours A6 L4 A5 L0 picked at (-40.3061, 96.1053)
ref_plane "Work Plane3" through (108.35, 36.5, -47) normal (-1, 0, 0) x (0, 0, 1)
split "Split2" plane through (108.35, 36.5, -47) removes the side toward (-1, 0, 0)
equation "\"d0\" = newCaseLength"
equation "\"d1\" = caseWidth"
equation "\"d2\" = caseDepth"
equation "\"d5\" = lensLength"
equation "\"d6\" = cameraWidth"
equation "\"d7\" = cameraLength"
equation "\"d8\" = maxComponentDepth"
equation "\"d13\" = fanDepth"
equation "\"d14\" = fanWidth"
equation "\"d15\" = rearWallThickness"
equation "\"d16\" = maxComponentDepth"
equation "\"d20\" = piCaseDepth"
equation "\"d21\" = piCaseLength"
equation "\"d88\" = minDelta"
equation "\"d22\" = maxComponentDepth"
equation "\"d25\" = minDelta"
equation "\"d26\" = poeWidth"
equation "\"d27\" = poeLength"
equation "\"d28\" = maxComponentDepth"
equation "\"d36\" = thermisterLength"
equation "\"d37\" = thermisterWidth"
equation "\"d85\" = frontWallThickness"
equation "\"d38\" = maxComponentDepth"
equation "\"d42\" = sensorLength"
equation "\"d43\" = sensorWidth"
equation "\"d86\" = frontWallThickness"
equation "\"d87\" = outsideWallThickness"
equation "\"d46\" = cutoutDepth"
equation "\"newCaseLength\" = 222.7"
equation "\"caseWidth\" = 149"
equation "\"caseDepth\" = 50"
equation "\"lensLength\" = 15.7"
equation "\"cameraWidth\" = 54"
equation "\"cameraLength\" = 59"
equation "\"maxComponentDepth\" = 47"
equation "\"fanDepth\" = 16"
equation "\"fanWidth\" = 62"
equation "\"rearWallThickness\" = 3"
equation "\"piCaseDepth\" = 32"
equation "\"piCaseLength\" = 129"
equation "\"minDelta\" = 16"
equation "\"poeWidth\" = 49"
equation "\"poeLength\" = 118"
equation "\"thermisterLength\" = 69"
equation "\"thermisterWidth\" = 28"
equation "\"frontWallThickness\" = 3"
equation "\"sensorLength\" = 50"
equation "\"sensorWidth\" = 17"
equation "\"outsideWallThickness\" = 10"
equation "\"cutoutDepth\" = 31.5"
properties part number "caseLowerPortionTestFront" material "PC/ABS Plastic"
